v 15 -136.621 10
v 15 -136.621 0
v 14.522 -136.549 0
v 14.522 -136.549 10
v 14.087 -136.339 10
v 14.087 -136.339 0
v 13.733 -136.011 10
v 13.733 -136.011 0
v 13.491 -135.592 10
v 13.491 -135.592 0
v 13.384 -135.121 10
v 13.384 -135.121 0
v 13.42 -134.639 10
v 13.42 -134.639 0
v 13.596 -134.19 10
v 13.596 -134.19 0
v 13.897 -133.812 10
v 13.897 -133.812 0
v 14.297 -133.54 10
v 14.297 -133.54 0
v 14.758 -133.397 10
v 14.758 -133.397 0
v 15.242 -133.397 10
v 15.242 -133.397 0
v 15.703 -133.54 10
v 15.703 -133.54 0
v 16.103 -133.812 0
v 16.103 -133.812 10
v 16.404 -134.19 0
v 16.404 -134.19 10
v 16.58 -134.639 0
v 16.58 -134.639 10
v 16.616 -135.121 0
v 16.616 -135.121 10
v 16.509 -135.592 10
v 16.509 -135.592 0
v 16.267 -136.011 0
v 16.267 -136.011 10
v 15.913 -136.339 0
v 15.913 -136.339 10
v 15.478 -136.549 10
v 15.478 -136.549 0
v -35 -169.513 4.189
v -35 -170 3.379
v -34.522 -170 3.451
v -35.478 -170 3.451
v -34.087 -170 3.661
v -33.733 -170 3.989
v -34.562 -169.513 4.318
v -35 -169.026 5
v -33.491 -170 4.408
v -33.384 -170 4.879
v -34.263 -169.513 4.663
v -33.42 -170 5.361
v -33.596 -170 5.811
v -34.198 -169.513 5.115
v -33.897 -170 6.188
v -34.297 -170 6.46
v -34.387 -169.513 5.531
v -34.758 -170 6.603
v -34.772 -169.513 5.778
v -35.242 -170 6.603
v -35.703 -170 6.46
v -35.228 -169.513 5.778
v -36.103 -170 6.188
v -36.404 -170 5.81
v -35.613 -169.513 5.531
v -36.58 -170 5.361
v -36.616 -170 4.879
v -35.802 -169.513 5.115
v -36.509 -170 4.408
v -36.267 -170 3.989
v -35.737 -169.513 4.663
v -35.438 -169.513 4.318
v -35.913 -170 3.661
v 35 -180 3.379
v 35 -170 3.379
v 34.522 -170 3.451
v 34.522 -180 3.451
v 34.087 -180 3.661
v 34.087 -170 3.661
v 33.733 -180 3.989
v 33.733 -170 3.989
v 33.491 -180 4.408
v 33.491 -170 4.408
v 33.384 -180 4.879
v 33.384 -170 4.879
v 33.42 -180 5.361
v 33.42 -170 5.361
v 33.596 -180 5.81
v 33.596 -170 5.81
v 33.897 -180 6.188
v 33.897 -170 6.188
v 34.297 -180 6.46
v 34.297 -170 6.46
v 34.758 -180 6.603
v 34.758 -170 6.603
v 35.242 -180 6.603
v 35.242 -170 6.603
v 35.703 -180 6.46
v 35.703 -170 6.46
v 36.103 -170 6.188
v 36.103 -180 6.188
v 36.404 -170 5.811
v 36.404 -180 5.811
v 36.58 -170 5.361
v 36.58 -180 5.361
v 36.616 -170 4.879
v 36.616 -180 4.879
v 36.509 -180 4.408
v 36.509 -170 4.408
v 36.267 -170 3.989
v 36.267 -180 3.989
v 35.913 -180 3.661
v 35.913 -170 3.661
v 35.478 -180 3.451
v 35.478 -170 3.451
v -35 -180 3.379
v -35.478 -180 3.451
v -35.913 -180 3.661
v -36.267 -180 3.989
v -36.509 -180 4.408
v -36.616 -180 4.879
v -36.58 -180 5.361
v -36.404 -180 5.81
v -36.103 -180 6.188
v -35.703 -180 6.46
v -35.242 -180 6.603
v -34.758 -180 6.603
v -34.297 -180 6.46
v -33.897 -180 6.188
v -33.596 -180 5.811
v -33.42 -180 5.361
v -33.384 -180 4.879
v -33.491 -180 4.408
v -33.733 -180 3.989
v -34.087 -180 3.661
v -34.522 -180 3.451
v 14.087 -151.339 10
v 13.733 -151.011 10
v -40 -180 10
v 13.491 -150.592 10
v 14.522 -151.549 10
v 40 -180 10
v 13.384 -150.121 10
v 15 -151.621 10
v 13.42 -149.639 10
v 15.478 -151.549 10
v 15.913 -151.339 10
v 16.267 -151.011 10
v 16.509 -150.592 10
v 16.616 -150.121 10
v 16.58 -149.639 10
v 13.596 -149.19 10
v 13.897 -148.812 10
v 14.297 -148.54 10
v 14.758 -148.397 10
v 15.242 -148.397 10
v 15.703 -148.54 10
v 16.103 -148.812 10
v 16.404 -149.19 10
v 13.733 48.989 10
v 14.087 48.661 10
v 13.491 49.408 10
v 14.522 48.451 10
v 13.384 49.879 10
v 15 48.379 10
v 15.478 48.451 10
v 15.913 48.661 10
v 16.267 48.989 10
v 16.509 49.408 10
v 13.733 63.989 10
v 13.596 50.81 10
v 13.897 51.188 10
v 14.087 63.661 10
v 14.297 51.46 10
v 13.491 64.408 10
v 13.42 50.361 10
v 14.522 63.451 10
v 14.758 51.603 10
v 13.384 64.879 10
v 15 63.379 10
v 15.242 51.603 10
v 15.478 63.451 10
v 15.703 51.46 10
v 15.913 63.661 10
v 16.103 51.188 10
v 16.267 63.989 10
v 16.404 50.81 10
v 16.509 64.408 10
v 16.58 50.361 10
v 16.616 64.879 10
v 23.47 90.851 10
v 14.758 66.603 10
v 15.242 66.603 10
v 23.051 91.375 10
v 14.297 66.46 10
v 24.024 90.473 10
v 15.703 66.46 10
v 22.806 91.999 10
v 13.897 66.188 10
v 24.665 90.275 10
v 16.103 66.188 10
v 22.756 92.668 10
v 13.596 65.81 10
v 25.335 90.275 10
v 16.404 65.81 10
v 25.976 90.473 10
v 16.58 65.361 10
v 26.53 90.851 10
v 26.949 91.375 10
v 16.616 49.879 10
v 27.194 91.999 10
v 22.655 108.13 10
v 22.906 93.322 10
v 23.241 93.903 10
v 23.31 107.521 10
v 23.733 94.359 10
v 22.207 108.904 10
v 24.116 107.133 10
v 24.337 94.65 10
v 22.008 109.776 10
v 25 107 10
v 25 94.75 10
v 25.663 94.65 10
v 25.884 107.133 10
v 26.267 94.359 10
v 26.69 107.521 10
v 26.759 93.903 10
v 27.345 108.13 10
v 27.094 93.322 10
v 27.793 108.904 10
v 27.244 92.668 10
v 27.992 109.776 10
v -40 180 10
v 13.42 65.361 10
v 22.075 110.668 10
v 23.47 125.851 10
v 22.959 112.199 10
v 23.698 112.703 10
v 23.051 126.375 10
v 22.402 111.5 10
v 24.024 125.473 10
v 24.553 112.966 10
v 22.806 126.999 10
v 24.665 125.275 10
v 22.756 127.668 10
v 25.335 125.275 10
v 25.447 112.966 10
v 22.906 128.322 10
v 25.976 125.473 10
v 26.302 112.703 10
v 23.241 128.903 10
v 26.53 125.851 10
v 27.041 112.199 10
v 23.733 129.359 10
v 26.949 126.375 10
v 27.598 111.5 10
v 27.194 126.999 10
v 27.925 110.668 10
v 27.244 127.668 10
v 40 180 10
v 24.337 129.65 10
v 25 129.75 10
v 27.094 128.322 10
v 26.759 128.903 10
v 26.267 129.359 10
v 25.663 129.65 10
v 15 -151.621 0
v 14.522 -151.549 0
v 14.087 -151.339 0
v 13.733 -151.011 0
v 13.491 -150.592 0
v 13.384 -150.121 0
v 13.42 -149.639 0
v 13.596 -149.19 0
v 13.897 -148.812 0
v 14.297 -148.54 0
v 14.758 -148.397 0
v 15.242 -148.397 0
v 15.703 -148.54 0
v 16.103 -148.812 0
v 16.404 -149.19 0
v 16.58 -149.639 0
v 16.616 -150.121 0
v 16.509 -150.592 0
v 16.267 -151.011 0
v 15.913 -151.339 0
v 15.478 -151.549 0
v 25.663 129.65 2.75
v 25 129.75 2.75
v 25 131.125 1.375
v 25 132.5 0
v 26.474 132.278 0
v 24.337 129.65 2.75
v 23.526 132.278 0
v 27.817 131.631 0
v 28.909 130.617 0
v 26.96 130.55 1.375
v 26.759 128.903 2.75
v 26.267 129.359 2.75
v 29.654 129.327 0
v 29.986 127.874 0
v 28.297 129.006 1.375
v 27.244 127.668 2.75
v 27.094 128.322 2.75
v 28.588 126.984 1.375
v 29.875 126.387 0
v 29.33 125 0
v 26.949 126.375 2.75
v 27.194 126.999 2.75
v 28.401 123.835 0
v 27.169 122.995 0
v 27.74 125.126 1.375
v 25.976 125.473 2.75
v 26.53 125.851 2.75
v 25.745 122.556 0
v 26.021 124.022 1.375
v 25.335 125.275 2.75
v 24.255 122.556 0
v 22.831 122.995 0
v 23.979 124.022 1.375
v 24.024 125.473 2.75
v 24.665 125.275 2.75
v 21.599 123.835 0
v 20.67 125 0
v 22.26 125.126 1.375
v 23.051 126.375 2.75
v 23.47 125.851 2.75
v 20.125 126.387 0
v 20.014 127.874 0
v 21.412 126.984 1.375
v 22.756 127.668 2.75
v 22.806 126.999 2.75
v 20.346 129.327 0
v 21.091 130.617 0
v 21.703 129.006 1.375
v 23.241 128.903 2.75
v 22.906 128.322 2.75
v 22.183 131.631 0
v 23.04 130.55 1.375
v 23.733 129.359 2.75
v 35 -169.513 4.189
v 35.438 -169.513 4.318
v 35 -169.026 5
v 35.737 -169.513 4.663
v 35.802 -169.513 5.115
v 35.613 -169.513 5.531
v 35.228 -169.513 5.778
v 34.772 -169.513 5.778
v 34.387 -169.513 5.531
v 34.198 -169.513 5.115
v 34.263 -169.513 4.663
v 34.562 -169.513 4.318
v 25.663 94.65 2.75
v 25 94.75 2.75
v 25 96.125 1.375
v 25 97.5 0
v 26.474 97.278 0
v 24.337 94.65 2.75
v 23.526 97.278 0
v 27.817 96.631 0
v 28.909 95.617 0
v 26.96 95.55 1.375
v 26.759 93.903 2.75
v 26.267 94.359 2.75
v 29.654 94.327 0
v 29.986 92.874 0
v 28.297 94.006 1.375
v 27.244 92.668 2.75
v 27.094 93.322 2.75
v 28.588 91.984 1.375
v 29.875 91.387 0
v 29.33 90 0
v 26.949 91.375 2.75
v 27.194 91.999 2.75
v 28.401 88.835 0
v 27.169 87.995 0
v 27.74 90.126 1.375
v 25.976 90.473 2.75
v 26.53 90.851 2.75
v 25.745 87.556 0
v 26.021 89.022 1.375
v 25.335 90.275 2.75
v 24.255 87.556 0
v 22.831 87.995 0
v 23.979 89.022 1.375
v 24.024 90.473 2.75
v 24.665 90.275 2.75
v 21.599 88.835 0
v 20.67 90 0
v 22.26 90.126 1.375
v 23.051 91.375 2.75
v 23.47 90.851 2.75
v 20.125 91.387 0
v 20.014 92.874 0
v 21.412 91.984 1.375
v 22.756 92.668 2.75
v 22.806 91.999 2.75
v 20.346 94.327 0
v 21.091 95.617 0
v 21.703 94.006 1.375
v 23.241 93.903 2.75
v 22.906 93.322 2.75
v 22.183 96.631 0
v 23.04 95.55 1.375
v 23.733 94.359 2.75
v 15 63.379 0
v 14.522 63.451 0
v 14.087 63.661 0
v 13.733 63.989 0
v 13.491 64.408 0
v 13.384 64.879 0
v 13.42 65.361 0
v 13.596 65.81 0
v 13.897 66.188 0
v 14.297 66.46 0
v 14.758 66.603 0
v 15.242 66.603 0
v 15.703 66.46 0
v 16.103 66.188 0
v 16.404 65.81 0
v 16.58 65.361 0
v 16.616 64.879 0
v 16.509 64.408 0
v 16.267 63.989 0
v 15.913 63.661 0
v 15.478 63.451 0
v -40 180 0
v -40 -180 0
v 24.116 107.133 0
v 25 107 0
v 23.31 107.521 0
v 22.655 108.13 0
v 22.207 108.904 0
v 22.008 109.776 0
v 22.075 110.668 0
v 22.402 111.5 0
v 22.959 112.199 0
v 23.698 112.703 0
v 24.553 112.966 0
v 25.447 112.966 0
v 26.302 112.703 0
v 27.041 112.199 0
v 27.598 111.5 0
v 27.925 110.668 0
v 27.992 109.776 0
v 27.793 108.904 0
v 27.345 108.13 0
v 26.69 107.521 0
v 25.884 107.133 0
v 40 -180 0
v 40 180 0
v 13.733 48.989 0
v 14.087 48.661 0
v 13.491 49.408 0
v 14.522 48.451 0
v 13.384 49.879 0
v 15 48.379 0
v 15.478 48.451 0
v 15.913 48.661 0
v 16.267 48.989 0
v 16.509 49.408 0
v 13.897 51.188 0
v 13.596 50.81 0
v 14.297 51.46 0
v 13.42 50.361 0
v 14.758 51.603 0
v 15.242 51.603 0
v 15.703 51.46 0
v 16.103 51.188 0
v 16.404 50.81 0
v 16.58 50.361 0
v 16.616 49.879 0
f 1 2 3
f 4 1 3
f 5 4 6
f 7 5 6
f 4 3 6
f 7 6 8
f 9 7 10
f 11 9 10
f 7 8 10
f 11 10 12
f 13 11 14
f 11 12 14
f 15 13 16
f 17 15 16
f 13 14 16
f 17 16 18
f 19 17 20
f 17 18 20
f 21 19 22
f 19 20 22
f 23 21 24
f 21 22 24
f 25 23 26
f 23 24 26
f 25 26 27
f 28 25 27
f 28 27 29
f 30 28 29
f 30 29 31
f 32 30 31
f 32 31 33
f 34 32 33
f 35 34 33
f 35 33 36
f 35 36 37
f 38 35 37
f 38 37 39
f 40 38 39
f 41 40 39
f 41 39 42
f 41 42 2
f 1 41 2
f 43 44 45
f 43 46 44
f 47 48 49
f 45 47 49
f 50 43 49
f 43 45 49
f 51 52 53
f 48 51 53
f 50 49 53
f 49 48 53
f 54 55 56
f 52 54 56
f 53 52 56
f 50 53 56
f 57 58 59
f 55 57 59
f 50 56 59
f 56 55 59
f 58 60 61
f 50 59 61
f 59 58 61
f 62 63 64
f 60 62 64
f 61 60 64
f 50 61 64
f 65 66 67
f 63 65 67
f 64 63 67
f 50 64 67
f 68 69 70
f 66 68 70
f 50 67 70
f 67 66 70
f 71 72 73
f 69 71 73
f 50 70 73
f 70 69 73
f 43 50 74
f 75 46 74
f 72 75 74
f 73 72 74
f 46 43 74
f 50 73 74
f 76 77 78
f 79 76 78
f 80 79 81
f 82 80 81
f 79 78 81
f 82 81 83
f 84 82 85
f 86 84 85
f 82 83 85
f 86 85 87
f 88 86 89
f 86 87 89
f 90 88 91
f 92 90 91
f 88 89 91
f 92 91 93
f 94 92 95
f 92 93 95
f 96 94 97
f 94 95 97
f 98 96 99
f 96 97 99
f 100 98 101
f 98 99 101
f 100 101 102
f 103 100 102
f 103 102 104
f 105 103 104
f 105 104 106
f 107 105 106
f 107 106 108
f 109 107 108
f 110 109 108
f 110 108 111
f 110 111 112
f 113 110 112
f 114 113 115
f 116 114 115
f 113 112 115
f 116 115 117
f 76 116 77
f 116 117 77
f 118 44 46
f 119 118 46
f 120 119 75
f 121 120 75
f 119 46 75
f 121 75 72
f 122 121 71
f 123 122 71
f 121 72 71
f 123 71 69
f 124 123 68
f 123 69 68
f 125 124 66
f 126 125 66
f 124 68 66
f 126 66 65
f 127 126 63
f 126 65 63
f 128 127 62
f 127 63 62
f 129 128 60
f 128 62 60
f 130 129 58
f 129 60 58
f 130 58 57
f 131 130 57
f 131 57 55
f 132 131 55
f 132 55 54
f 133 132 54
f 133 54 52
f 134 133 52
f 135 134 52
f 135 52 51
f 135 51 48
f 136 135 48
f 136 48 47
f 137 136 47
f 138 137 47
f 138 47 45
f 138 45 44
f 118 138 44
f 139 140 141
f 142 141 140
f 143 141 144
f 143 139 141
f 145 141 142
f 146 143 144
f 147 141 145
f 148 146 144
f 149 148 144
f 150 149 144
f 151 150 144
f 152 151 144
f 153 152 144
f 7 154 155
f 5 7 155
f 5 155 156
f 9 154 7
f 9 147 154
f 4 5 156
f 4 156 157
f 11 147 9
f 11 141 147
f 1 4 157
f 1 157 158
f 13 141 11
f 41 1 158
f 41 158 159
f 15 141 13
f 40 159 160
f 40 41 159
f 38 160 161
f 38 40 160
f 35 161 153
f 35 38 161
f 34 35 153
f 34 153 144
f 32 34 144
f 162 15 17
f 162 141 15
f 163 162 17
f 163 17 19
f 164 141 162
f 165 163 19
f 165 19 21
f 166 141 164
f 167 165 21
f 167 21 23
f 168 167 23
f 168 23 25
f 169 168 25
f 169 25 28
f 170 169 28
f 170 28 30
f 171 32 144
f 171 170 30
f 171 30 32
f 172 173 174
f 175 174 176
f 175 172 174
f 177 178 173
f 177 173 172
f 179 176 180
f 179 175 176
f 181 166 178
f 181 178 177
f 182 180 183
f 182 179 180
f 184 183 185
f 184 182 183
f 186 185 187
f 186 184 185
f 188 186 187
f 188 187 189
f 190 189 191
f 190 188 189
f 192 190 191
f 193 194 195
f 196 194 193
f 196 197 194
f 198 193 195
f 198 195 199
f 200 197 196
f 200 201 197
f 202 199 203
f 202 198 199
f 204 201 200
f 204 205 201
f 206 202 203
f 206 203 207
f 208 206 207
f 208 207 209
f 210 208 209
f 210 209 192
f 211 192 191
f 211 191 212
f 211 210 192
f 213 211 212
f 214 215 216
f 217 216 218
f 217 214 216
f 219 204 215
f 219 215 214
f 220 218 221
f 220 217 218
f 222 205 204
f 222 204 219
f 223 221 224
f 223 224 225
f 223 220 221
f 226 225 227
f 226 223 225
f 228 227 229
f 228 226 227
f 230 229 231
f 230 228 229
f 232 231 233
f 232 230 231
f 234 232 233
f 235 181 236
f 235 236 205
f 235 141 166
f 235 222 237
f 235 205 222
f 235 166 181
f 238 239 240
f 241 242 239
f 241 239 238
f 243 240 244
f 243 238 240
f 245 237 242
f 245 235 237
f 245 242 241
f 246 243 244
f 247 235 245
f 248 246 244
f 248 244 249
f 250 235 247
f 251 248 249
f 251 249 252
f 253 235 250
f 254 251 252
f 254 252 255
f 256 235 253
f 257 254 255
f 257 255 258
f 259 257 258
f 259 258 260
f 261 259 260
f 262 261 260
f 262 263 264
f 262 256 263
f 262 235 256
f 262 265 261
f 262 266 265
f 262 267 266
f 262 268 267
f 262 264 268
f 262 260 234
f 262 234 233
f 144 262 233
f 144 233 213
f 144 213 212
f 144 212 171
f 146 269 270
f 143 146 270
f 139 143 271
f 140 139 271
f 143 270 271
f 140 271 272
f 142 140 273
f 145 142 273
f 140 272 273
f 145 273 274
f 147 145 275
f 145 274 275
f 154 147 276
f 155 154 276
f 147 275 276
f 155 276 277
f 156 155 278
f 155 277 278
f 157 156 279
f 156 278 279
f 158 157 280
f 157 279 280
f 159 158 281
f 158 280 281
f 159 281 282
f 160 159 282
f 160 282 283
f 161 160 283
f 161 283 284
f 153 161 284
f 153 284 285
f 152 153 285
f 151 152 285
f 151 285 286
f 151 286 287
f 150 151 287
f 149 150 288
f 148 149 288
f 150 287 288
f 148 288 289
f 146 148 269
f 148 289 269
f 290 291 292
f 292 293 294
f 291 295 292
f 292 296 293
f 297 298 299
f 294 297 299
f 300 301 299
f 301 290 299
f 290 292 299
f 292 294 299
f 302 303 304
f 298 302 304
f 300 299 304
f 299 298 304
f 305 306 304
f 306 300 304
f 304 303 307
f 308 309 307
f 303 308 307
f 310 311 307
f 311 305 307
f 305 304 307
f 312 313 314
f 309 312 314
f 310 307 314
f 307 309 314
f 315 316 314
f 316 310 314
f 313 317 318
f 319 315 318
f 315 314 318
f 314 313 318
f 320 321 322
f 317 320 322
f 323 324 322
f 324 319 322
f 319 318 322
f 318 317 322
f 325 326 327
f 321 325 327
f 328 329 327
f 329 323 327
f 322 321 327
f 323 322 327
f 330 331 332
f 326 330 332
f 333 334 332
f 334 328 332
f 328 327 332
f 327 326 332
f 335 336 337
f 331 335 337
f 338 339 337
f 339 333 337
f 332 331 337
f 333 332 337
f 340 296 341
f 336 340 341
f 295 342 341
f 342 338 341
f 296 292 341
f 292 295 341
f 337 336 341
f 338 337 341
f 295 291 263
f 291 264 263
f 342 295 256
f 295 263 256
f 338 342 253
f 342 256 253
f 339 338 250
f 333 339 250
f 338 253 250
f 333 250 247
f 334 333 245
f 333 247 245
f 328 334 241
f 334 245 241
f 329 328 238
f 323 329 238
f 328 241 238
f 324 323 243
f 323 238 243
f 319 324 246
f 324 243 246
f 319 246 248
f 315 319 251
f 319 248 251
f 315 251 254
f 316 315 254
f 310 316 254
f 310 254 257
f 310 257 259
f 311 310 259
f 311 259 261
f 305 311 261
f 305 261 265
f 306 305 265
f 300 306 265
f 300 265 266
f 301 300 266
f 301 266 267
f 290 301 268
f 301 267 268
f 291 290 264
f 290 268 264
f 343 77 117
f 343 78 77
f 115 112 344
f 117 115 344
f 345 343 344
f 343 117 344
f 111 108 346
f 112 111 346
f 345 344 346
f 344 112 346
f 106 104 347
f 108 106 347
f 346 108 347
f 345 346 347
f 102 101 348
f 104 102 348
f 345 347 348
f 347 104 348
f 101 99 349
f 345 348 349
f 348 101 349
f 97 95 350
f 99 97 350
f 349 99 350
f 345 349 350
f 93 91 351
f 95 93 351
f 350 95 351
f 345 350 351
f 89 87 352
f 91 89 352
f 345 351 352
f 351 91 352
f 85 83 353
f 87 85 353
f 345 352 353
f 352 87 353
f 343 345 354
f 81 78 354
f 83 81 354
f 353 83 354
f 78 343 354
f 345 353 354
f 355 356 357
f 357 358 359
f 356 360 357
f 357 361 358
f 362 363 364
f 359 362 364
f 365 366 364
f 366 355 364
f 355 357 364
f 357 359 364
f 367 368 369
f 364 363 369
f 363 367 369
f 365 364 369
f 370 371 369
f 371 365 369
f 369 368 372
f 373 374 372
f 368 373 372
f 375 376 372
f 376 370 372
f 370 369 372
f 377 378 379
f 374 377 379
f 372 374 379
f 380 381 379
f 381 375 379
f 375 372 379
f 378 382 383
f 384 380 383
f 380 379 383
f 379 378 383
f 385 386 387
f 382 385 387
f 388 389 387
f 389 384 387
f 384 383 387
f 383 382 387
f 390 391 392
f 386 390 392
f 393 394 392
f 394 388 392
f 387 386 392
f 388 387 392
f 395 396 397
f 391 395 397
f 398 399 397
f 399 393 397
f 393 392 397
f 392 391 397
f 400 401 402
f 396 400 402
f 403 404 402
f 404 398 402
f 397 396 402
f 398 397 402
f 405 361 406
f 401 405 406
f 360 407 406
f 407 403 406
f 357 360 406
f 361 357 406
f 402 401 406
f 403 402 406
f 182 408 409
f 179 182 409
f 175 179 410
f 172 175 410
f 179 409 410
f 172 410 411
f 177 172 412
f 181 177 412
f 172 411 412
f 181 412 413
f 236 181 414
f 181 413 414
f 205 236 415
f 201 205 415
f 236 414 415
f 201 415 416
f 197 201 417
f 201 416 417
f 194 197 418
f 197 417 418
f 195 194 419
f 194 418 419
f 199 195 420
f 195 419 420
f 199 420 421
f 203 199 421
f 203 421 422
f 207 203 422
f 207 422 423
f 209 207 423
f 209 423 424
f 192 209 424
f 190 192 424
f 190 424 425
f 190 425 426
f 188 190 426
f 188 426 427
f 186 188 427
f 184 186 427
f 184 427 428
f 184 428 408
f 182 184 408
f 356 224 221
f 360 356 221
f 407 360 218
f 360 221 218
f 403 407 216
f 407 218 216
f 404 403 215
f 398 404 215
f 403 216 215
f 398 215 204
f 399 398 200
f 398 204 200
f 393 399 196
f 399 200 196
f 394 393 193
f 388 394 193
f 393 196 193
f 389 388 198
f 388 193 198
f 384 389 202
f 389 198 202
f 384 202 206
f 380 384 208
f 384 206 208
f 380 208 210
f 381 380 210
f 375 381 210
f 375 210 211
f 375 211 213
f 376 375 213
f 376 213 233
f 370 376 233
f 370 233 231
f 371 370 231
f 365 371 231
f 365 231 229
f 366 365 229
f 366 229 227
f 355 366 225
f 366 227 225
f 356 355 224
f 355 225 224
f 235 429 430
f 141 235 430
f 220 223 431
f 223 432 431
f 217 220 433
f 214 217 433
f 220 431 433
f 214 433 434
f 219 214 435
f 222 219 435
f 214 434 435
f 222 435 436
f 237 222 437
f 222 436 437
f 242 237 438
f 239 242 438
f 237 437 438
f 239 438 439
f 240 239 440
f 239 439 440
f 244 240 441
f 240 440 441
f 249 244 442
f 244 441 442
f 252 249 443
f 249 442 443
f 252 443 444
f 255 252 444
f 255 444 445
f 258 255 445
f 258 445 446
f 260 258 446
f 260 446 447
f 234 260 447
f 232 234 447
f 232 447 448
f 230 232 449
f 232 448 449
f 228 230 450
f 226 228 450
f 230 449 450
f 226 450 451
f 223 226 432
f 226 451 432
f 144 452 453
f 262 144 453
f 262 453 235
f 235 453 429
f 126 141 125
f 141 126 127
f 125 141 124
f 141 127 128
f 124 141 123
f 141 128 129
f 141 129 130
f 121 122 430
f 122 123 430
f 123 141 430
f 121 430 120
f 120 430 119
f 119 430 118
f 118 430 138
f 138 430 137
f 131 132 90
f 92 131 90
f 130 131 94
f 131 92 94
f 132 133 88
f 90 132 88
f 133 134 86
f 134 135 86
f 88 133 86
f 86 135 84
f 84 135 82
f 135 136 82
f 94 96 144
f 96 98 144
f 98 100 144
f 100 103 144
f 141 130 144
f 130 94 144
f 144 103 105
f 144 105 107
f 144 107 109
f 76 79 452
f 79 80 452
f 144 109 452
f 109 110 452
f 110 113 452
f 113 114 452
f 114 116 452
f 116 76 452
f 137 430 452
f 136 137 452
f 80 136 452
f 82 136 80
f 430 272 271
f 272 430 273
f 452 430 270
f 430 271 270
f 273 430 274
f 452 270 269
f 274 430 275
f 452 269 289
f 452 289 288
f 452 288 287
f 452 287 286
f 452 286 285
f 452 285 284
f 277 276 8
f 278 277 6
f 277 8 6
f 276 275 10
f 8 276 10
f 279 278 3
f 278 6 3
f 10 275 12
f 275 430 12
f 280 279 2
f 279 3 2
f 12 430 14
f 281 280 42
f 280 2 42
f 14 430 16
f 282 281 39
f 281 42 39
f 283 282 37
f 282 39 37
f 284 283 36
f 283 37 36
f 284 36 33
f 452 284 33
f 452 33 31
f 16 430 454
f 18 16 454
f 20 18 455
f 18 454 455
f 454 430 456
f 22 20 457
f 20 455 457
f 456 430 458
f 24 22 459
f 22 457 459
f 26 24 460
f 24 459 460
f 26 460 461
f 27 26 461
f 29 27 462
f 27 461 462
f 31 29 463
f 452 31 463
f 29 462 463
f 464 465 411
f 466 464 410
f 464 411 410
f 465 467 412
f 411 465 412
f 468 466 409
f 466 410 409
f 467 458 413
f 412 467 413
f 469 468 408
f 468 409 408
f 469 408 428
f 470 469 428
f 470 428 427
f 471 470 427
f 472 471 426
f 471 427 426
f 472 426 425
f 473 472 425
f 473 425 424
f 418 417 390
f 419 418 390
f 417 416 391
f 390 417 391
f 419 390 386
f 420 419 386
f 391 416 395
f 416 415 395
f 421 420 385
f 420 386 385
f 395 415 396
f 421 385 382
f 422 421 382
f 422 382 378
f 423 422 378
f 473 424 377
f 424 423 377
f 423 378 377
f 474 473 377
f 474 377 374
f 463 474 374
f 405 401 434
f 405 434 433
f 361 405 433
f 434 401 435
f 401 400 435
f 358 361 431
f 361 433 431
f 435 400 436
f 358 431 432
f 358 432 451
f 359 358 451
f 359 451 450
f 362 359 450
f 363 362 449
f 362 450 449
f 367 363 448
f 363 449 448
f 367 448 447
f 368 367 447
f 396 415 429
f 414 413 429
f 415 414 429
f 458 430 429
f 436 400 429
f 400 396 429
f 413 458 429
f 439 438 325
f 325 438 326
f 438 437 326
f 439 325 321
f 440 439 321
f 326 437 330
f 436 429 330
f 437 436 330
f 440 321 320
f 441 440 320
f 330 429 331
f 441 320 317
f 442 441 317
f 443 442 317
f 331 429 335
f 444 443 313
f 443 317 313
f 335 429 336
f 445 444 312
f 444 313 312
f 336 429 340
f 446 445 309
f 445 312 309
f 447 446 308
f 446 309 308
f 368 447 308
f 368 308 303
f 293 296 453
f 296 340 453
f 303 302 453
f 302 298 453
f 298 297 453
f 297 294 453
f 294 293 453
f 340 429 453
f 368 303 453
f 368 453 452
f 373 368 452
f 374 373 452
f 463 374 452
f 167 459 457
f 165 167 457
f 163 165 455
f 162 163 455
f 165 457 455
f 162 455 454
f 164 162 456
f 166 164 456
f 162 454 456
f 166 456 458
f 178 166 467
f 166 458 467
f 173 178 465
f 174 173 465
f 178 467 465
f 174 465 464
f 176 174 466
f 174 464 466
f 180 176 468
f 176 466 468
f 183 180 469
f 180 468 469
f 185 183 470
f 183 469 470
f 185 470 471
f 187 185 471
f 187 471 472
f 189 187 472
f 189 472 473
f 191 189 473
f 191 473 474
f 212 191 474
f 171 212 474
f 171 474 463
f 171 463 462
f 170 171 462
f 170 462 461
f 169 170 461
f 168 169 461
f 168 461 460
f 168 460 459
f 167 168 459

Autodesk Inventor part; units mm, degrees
ref_plane "YZ Plane" through (0, 0, 0) normal (1, 0, 0) x (0, 1, 0)
ref_plane "XZ Plane" through (0, 0, 0) normal (0, 1, 0) x (-1, 0, 0)
ref_plane "XY Plane" through (0, 0, 0) normal (0, 0, 1) x (1, 0, 0)
sketch "Skizze1" plane through (0, 0, 0) normal (0, 0, 1) x (1, 0, 0)
  line L0 (40, 180) -> (-40, 180)
  line L1 (-40, 180) -> (-40, -180)
  line L2 (-40, -180) -> (40, -180)
  line L3 (40, -180) -> (40, 180)
  line L4 (40, 180) -> (-40, -180) construction
  line L5 (-40, 180) -> (40, -180) construction
  point P0 (0, 0)
  dimension "d0" = 80
  dimension "d1" = 360
extrude "Extrusion1" add sketch "Skizze1" along normal blind 10
sketch "Skizze2" plane through (0, 0, 10) normal (0, 0, 1) x (1, 0, 0)
  line L0 (40, 180) -> (-40, 180) projected
  line L1 (40, -180) -> (40, 180) projected
  point P0 (0, 0)
  point P1 (25, 110)
  dimension "d16" = 15
  dimension "d17" = 70
hole "Bohrung2" at (25, 110, 10) direction (0, 0, -1) diameter 6 end through all
sketch "Skizze3" plane through (0, 0, 0) normal (0, 0, -1) x (-1, 0, 0)
  circle A0 centre (-25, 110) radius 3 projected
  line L0 (40, 180) -> (40, -180) projected
  line L1 (-25, 92.5) -> (-25, 127.5) construction
  point P0 (0, 0)
  dimension "d25" = 35
hole "Bohrung3" at (25, 92.5, 0) at (25, 127.5, 0) direction (0, 0, 1) diameter 4.5 end through all countersink diameter 10 countersink angle 90 clearance for "Innensechskant-Senkkopfschraube DIN EN ISO 10642" size "M4" standard "DIN"
sketch "Skizze4" plane through (0, 0, 10) normal (0, 0, 1) x (1, 0, 0)
  line L0 (-40, 180) -> (-40, -180) projected
  line L1 (-40, -180) -> (40, -180) projected
  line L2 (40, -180) -> (40, 180) projected
  line L3 (15, -135) -> (15, -150) construction
  point P0 (0, 0)
  dimension "d34" = 15
  dimension "d35" = 30
  dimension "d36" = 55
hole "Bohrung4" at (15, -150, 10) at (15, -135, 10) direction (0, 0, -1) diameter 3.242 end through all thread size "M4x0.7" class "6H" standard "ISO Metric profile"
pattern_linear "Rechteckige Anordnung2" count 2 spacing 200 along (0, 1, 0) of "Bohrung4"
sketch "Skizze5" plane through (-40, -180, 0) normal (0, -1, 0) x (1, 0, 0)
  line L0 (0, 0) -> (80, 0) projected
  line L1 (0, 0) -> (0, 10) projected
  line L2 (5, 5) -> (75, 5)
  point P0 (40, 0)
  point P1 (40, 5)
  point P2 (40, 0)
  point P3 (0, 5)
  dimension "d47" = 5
hole "Bohrung5" at (-35, -180, 5) at (35, -180, 5) direction (0, 1, 0) diameter 3.242 depth 10 tip angle 118 thread size "M4x0.7" class "6H" standard "ISO Metric profile"
properties part number "Tunel_SidePanel" material "Polycarbonat, klar"
